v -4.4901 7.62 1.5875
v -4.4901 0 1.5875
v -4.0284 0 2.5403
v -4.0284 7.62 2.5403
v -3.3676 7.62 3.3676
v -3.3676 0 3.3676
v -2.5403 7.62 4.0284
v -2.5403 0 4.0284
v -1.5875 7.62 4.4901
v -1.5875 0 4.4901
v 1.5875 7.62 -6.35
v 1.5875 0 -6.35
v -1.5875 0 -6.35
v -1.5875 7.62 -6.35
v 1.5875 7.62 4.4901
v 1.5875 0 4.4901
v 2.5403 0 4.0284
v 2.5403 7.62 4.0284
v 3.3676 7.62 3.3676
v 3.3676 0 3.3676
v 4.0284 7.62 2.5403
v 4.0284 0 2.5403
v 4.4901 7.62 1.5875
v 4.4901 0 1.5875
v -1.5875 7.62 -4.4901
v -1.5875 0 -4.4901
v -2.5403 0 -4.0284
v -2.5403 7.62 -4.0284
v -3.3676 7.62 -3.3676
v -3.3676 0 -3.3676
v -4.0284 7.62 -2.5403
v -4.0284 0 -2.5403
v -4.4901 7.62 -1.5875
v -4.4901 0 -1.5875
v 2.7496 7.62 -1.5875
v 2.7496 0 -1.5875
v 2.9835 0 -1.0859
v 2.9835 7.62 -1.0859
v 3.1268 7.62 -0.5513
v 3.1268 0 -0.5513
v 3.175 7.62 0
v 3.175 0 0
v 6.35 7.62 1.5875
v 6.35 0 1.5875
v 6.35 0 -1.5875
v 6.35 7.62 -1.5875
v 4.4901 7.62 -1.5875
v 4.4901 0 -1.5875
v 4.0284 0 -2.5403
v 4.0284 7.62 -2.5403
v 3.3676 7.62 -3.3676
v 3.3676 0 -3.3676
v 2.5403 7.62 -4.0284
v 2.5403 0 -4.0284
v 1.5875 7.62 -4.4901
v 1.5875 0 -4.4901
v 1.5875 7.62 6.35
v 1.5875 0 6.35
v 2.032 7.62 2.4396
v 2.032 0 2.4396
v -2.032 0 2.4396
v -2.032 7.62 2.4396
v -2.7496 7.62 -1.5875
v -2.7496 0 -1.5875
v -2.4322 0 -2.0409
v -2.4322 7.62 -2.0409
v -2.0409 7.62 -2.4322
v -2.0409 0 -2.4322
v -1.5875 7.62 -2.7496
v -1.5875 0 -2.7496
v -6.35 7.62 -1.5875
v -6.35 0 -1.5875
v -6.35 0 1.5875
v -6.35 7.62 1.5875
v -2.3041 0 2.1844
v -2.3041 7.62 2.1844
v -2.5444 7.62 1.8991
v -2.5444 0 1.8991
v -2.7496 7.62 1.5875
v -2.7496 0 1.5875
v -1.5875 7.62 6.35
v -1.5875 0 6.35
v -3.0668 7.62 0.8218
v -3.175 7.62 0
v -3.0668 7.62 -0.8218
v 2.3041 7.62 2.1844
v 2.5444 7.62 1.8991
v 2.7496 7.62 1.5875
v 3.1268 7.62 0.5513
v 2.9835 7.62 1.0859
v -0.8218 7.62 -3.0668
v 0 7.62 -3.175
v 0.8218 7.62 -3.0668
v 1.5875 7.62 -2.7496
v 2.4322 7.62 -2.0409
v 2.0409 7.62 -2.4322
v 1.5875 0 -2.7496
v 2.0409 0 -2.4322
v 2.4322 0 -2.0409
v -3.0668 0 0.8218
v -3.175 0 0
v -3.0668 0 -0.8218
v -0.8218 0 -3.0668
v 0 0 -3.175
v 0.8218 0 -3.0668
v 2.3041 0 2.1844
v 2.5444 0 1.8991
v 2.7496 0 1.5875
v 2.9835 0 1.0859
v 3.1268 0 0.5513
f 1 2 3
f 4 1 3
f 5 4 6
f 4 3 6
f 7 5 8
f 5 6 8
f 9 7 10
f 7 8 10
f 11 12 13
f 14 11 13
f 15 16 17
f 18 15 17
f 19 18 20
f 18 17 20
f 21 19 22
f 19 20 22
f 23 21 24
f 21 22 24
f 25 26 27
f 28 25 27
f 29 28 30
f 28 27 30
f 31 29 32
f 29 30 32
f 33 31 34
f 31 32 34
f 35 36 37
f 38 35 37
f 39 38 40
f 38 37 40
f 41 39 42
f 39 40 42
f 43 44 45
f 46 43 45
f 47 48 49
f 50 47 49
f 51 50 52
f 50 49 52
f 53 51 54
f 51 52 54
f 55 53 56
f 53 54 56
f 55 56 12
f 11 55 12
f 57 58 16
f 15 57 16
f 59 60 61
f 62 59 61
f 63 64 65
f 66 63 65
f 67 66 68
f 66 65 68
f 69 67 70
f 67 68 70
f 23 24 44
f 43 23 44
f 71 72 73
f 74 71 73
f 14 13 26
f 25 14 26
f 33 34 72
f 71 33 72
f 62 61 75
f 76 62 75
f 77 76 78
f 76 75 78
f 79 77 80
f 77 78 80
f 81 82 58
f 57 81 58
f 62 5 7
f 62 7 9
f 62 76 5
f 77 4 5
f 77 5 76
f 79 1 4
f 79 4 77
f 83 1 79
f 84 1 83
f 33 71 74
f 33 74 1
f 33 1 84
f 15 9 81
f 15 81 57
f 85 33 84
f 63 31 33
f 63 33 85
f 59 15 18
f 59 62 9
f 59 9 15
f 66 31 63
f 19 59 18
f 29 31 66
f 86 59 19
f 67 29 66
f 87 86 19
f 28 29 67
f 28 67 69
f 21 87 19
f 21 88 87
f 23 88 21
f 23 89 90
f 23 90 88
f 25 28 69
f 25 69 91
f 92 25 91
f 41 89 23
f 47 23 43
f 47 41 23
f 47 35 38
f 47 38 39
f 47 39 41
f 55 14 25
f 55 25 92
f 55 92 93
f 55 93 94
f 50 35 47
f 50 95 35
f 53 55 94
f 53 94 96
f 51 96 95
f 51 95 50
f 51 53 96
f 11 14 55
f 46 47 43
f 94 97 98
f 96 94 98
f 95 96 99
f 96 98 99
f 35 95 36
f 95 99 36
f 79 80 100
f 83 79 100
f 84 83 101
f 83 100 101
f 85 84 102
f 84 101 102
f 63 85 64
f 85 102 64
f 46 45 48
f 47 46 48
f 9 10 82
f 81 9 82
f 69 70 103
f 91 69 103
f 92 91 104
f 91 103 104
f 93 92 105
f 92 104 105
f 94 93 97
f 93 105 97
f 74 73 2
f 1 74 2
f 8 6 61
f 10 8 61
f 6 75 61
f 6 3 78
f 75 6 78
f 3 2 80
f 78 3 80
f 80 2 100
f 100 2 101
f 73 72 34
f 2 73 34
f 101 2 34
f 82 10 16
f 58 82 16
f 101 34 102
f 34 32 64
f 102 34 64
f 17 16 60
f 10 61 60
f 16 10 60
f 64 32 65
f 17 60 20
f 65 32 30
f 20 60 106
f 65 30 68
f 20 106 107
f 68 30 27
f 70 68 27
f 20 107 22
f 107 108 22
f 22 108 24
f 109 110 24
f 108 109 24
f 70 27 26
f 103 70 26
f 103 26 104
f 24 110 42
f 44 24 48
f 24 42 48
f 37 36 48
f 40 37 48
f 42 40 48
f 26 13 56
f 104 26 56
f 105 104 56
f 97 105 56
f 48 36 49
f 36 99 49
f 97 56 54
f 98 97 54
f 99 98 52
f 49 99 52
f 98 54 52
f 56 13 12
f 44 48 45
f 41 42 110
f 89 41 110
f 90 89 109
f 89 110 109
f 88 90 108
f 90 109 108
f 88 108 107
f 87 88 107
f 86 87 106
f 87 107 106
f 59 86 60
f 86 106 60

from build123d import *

# Parameters (mm, degrees)
BOSS_EXTRUDE3_DEPTH = 7.62


with BuildPart() as part:
    # Sketch3 → Boss-Extrude3 (new body)
    with BuildSketch(Plane(origin=(0, 0, 0), x_dir=(1, 0, 0), z_dir=(0, 1, 0))):
        with BuildLine():
            ThreePointArc((-1.5875, 4.490128061), (0, 4.7625), (1.5875, 4.490128061))
            Line((1.5875, 4.490128061), (1.5875, 6.35))
            Line((1.5875, 6.35), (-1.5875, 6.35))
            Line((-1.5875, 6.35), (-1.5875, 4.490128061))
        make_face()
        with BuildLine():
            Line((-6.35, -1.5875), (-4.490128061, -1.5875))
            ThreePointArc((-4.490128061, -1.5875), (-4.7625, 0), (-4.490128061, 1.5875))
            Line((-4.490128061, 1.5875), (-6.35, 1.5875))
            Line((-6.35, 1.5875), (-6.35, -1.5875))
        make_face()
        with BuildLine():
            Line((-4.490128061, 1.5875), (-2.749630657, 1.5875))
            ThreePointArc((-2.749630657, 1.5875), (-2.24506403, 2.24506403), (-1.5875, 2.749630657))
            Line((-1.5875, 2.749630657), (-1.5875, 4.490128061))
            ThreePointArc((-1.5875, 4.490128061), (-3.367596045, 3.367596045), (-4.490128061, 1.5875))
        make_face()
        with BuildLine():
            Line((-4.490128061, -1.5875), (-2.749630657, -1.5875))
            ThreePointArc((-2.749630657, -1.5875), (-3.175, 0), (-2.749630657, 1.5875))
            Line((-2.749630657, 1.5875), (-4.490128061, 1.5875))
            ThreePointArc((-4.490128061, 1.5875), (-4.7625, 0), (-4.490128061, -1.5875))
        make_face()
        with BuildLine():
            ThreePointArc((-1.5875, 2.749630657), (0, 3.175), (1.5875, 2.749630657))
            Line((1.5875, 2.749630657), (1.5875, 4.490128061))
            ThreePointArc((1.5875, 4.490128061), (0, 4.7625), (-1.5875, 4.490128061))
            Line((-1.5875, 4.490128061), (-1.5875, 2.749630657))
        make_face()
        with BuildLine():
            ThreePointArc((1.5875, 2.749630657), (2.24506403, 2.24506403), (2.749630657, 1.5875))
            Line((2.749630657, 1.5875), (4.490128061, 1.5875))
            ThreePointArc((4.490128061, 1.5875), (3.367596045, 3.367596045), (1.5875, 4.490128061))
            Line((1.5875, 4.490128061), (1.5875, 2.749630657))
        make_face()
        with BuildLine():
            ThreePointArc((4.7625, 0), (4.69391314, -0.805348174), (4.490128061, -1.5875))
            Line((4.490128061, -1.5875), (6.35, -1.5875))
            Line((6.35, -1.5875), (6.35, 1.5875))
            Line((6.35, 1.5875), (4.490128061, 1.5875))
            ThreePointArc((4.490128061, 1.5875), (4.69391314, 0.805348174), (4.7625, 0))
        make_face()
        with BuildLine():
            ThreePointArc((3.175, 0), (3.066814498, -0.821750468), (2.749630657, -1.5875))
            Line((2.749630657, -1.5875), (4.490128061, -1.5875))
            ThreePointArc((4.490128061, -1.5875), (4.69391314, -0.805348174), (4.7625, 0))
            ThreePointArc((4.7625, 0), (4.69391314, 0.805348174), (4.490128061, 1.5875))
            Line((4.490128061, 1.5875), (2.749630657, 1.5875))
            ThreePointArc((2.749630657, 1.5875), (3.066814498, 0.821750468), (3.175, 0))
        make_face()
        with BuildLine():
            Line((-1.5875, -4.490128061), (-1.5875, -2.749630657))
            ThreePointArc((-1.5875, -2.749630657), (-1.81637725, -2.604111881), (-2.032, -2.439590334))
            ThreePointArc((-2.032, -2.439590334), (-2.428479446, -2.045265895), (-2.749630657, -1.5875))
            Line((-2.749630657, -1.5875), (-4.490128061, -1.5875))
            ThreePointArc((-4.490128061, -1.5875), (-3.367596045, -3.367596045), (-1.5875, -4.490128061))
        make_face()
        with BuildLine():
            Line((-1.5875, -2.749630657), (-1.5875, -2.439590334))
            Line((-1.5875, -2.439590334), (-2.032, -2.439590334))
            ThreePointArc((-2.032, -2.439590334), (-1.81637725, -2.604111881), (-1.5875, -2.749630657))
        make_face()
        with BuildLine():
            Line((1.5875, -2.749630657), (1.5875, -2.439590334))
            Line((1.5875, -2.439590334), (-1.5875, -2.439590334))
            Line((-1.5875, -2.439590334), (-1.5875, -2.749630657))
            ThreePointArc((-1.5875, -2.749630657), (0, -3.175), (1.5875, -2.749630657))
        make_face()
        with BuildLine():
            ThreePointArc((1.5875, -2.749630657), (1.81637725, -2.604111881), (2.032, -2.439590334))
            Line((2.032, -2.439590334), (1.5875, -2.439590334))
            Line((1.5875, -2.439590334), (1.5875, -2.749630657))
        make_face()
        with BuildLine():
            ThreePointArc((2.749630657, -1.5875), (2.428479446, -2.045265895), (2.032, -2.439590334))
            ThreePointArc((2.032, -2.439590334), (1.81637725, -2.604111881), (1.5875, -2.749630657))
            Line((1.5875, -2.749630657), (1.5875, -4.490128061))
            ThreePointArc((1.5875, -4.490128061), (3.367596045, -3.367596045), (4.490128061, -1.5875))
            Line((4.490128061, -1.5875), (2.749630657, -1.5875))
        make_face()
        with BuildLine():
            Line((1.5875, -4.490128061), (1.5875, -2.749630657))
            ThreePointArc((1.5875, -2.749630657), (0, -3.175), (-1.5875, -2.749630657))
            Line((-1.5875, -2.749630657), (-1.5875, -4.490128061))
            ThreePointArc((-1.5875, -4.490128061), (0, -4.7625), (1.5875, -4.490128061))
        make_face()
        with BuildLine():
            Line((1.5875, -6.35), (1.5875, -4.490128061))
            ThreePointArc((1.5875, -4.490128061), (0, -4.7625), (-1.5875, -4.490128061))
            Line((-1.5875, -4.490128061), (-1.5875, -6.35))
            Line((-1.5875, -6.35), (1.5875, -6.35))
        make_face()
    extrude(amount=BOSS_EXTRUDE3_DEPTH)


solid = part.part
